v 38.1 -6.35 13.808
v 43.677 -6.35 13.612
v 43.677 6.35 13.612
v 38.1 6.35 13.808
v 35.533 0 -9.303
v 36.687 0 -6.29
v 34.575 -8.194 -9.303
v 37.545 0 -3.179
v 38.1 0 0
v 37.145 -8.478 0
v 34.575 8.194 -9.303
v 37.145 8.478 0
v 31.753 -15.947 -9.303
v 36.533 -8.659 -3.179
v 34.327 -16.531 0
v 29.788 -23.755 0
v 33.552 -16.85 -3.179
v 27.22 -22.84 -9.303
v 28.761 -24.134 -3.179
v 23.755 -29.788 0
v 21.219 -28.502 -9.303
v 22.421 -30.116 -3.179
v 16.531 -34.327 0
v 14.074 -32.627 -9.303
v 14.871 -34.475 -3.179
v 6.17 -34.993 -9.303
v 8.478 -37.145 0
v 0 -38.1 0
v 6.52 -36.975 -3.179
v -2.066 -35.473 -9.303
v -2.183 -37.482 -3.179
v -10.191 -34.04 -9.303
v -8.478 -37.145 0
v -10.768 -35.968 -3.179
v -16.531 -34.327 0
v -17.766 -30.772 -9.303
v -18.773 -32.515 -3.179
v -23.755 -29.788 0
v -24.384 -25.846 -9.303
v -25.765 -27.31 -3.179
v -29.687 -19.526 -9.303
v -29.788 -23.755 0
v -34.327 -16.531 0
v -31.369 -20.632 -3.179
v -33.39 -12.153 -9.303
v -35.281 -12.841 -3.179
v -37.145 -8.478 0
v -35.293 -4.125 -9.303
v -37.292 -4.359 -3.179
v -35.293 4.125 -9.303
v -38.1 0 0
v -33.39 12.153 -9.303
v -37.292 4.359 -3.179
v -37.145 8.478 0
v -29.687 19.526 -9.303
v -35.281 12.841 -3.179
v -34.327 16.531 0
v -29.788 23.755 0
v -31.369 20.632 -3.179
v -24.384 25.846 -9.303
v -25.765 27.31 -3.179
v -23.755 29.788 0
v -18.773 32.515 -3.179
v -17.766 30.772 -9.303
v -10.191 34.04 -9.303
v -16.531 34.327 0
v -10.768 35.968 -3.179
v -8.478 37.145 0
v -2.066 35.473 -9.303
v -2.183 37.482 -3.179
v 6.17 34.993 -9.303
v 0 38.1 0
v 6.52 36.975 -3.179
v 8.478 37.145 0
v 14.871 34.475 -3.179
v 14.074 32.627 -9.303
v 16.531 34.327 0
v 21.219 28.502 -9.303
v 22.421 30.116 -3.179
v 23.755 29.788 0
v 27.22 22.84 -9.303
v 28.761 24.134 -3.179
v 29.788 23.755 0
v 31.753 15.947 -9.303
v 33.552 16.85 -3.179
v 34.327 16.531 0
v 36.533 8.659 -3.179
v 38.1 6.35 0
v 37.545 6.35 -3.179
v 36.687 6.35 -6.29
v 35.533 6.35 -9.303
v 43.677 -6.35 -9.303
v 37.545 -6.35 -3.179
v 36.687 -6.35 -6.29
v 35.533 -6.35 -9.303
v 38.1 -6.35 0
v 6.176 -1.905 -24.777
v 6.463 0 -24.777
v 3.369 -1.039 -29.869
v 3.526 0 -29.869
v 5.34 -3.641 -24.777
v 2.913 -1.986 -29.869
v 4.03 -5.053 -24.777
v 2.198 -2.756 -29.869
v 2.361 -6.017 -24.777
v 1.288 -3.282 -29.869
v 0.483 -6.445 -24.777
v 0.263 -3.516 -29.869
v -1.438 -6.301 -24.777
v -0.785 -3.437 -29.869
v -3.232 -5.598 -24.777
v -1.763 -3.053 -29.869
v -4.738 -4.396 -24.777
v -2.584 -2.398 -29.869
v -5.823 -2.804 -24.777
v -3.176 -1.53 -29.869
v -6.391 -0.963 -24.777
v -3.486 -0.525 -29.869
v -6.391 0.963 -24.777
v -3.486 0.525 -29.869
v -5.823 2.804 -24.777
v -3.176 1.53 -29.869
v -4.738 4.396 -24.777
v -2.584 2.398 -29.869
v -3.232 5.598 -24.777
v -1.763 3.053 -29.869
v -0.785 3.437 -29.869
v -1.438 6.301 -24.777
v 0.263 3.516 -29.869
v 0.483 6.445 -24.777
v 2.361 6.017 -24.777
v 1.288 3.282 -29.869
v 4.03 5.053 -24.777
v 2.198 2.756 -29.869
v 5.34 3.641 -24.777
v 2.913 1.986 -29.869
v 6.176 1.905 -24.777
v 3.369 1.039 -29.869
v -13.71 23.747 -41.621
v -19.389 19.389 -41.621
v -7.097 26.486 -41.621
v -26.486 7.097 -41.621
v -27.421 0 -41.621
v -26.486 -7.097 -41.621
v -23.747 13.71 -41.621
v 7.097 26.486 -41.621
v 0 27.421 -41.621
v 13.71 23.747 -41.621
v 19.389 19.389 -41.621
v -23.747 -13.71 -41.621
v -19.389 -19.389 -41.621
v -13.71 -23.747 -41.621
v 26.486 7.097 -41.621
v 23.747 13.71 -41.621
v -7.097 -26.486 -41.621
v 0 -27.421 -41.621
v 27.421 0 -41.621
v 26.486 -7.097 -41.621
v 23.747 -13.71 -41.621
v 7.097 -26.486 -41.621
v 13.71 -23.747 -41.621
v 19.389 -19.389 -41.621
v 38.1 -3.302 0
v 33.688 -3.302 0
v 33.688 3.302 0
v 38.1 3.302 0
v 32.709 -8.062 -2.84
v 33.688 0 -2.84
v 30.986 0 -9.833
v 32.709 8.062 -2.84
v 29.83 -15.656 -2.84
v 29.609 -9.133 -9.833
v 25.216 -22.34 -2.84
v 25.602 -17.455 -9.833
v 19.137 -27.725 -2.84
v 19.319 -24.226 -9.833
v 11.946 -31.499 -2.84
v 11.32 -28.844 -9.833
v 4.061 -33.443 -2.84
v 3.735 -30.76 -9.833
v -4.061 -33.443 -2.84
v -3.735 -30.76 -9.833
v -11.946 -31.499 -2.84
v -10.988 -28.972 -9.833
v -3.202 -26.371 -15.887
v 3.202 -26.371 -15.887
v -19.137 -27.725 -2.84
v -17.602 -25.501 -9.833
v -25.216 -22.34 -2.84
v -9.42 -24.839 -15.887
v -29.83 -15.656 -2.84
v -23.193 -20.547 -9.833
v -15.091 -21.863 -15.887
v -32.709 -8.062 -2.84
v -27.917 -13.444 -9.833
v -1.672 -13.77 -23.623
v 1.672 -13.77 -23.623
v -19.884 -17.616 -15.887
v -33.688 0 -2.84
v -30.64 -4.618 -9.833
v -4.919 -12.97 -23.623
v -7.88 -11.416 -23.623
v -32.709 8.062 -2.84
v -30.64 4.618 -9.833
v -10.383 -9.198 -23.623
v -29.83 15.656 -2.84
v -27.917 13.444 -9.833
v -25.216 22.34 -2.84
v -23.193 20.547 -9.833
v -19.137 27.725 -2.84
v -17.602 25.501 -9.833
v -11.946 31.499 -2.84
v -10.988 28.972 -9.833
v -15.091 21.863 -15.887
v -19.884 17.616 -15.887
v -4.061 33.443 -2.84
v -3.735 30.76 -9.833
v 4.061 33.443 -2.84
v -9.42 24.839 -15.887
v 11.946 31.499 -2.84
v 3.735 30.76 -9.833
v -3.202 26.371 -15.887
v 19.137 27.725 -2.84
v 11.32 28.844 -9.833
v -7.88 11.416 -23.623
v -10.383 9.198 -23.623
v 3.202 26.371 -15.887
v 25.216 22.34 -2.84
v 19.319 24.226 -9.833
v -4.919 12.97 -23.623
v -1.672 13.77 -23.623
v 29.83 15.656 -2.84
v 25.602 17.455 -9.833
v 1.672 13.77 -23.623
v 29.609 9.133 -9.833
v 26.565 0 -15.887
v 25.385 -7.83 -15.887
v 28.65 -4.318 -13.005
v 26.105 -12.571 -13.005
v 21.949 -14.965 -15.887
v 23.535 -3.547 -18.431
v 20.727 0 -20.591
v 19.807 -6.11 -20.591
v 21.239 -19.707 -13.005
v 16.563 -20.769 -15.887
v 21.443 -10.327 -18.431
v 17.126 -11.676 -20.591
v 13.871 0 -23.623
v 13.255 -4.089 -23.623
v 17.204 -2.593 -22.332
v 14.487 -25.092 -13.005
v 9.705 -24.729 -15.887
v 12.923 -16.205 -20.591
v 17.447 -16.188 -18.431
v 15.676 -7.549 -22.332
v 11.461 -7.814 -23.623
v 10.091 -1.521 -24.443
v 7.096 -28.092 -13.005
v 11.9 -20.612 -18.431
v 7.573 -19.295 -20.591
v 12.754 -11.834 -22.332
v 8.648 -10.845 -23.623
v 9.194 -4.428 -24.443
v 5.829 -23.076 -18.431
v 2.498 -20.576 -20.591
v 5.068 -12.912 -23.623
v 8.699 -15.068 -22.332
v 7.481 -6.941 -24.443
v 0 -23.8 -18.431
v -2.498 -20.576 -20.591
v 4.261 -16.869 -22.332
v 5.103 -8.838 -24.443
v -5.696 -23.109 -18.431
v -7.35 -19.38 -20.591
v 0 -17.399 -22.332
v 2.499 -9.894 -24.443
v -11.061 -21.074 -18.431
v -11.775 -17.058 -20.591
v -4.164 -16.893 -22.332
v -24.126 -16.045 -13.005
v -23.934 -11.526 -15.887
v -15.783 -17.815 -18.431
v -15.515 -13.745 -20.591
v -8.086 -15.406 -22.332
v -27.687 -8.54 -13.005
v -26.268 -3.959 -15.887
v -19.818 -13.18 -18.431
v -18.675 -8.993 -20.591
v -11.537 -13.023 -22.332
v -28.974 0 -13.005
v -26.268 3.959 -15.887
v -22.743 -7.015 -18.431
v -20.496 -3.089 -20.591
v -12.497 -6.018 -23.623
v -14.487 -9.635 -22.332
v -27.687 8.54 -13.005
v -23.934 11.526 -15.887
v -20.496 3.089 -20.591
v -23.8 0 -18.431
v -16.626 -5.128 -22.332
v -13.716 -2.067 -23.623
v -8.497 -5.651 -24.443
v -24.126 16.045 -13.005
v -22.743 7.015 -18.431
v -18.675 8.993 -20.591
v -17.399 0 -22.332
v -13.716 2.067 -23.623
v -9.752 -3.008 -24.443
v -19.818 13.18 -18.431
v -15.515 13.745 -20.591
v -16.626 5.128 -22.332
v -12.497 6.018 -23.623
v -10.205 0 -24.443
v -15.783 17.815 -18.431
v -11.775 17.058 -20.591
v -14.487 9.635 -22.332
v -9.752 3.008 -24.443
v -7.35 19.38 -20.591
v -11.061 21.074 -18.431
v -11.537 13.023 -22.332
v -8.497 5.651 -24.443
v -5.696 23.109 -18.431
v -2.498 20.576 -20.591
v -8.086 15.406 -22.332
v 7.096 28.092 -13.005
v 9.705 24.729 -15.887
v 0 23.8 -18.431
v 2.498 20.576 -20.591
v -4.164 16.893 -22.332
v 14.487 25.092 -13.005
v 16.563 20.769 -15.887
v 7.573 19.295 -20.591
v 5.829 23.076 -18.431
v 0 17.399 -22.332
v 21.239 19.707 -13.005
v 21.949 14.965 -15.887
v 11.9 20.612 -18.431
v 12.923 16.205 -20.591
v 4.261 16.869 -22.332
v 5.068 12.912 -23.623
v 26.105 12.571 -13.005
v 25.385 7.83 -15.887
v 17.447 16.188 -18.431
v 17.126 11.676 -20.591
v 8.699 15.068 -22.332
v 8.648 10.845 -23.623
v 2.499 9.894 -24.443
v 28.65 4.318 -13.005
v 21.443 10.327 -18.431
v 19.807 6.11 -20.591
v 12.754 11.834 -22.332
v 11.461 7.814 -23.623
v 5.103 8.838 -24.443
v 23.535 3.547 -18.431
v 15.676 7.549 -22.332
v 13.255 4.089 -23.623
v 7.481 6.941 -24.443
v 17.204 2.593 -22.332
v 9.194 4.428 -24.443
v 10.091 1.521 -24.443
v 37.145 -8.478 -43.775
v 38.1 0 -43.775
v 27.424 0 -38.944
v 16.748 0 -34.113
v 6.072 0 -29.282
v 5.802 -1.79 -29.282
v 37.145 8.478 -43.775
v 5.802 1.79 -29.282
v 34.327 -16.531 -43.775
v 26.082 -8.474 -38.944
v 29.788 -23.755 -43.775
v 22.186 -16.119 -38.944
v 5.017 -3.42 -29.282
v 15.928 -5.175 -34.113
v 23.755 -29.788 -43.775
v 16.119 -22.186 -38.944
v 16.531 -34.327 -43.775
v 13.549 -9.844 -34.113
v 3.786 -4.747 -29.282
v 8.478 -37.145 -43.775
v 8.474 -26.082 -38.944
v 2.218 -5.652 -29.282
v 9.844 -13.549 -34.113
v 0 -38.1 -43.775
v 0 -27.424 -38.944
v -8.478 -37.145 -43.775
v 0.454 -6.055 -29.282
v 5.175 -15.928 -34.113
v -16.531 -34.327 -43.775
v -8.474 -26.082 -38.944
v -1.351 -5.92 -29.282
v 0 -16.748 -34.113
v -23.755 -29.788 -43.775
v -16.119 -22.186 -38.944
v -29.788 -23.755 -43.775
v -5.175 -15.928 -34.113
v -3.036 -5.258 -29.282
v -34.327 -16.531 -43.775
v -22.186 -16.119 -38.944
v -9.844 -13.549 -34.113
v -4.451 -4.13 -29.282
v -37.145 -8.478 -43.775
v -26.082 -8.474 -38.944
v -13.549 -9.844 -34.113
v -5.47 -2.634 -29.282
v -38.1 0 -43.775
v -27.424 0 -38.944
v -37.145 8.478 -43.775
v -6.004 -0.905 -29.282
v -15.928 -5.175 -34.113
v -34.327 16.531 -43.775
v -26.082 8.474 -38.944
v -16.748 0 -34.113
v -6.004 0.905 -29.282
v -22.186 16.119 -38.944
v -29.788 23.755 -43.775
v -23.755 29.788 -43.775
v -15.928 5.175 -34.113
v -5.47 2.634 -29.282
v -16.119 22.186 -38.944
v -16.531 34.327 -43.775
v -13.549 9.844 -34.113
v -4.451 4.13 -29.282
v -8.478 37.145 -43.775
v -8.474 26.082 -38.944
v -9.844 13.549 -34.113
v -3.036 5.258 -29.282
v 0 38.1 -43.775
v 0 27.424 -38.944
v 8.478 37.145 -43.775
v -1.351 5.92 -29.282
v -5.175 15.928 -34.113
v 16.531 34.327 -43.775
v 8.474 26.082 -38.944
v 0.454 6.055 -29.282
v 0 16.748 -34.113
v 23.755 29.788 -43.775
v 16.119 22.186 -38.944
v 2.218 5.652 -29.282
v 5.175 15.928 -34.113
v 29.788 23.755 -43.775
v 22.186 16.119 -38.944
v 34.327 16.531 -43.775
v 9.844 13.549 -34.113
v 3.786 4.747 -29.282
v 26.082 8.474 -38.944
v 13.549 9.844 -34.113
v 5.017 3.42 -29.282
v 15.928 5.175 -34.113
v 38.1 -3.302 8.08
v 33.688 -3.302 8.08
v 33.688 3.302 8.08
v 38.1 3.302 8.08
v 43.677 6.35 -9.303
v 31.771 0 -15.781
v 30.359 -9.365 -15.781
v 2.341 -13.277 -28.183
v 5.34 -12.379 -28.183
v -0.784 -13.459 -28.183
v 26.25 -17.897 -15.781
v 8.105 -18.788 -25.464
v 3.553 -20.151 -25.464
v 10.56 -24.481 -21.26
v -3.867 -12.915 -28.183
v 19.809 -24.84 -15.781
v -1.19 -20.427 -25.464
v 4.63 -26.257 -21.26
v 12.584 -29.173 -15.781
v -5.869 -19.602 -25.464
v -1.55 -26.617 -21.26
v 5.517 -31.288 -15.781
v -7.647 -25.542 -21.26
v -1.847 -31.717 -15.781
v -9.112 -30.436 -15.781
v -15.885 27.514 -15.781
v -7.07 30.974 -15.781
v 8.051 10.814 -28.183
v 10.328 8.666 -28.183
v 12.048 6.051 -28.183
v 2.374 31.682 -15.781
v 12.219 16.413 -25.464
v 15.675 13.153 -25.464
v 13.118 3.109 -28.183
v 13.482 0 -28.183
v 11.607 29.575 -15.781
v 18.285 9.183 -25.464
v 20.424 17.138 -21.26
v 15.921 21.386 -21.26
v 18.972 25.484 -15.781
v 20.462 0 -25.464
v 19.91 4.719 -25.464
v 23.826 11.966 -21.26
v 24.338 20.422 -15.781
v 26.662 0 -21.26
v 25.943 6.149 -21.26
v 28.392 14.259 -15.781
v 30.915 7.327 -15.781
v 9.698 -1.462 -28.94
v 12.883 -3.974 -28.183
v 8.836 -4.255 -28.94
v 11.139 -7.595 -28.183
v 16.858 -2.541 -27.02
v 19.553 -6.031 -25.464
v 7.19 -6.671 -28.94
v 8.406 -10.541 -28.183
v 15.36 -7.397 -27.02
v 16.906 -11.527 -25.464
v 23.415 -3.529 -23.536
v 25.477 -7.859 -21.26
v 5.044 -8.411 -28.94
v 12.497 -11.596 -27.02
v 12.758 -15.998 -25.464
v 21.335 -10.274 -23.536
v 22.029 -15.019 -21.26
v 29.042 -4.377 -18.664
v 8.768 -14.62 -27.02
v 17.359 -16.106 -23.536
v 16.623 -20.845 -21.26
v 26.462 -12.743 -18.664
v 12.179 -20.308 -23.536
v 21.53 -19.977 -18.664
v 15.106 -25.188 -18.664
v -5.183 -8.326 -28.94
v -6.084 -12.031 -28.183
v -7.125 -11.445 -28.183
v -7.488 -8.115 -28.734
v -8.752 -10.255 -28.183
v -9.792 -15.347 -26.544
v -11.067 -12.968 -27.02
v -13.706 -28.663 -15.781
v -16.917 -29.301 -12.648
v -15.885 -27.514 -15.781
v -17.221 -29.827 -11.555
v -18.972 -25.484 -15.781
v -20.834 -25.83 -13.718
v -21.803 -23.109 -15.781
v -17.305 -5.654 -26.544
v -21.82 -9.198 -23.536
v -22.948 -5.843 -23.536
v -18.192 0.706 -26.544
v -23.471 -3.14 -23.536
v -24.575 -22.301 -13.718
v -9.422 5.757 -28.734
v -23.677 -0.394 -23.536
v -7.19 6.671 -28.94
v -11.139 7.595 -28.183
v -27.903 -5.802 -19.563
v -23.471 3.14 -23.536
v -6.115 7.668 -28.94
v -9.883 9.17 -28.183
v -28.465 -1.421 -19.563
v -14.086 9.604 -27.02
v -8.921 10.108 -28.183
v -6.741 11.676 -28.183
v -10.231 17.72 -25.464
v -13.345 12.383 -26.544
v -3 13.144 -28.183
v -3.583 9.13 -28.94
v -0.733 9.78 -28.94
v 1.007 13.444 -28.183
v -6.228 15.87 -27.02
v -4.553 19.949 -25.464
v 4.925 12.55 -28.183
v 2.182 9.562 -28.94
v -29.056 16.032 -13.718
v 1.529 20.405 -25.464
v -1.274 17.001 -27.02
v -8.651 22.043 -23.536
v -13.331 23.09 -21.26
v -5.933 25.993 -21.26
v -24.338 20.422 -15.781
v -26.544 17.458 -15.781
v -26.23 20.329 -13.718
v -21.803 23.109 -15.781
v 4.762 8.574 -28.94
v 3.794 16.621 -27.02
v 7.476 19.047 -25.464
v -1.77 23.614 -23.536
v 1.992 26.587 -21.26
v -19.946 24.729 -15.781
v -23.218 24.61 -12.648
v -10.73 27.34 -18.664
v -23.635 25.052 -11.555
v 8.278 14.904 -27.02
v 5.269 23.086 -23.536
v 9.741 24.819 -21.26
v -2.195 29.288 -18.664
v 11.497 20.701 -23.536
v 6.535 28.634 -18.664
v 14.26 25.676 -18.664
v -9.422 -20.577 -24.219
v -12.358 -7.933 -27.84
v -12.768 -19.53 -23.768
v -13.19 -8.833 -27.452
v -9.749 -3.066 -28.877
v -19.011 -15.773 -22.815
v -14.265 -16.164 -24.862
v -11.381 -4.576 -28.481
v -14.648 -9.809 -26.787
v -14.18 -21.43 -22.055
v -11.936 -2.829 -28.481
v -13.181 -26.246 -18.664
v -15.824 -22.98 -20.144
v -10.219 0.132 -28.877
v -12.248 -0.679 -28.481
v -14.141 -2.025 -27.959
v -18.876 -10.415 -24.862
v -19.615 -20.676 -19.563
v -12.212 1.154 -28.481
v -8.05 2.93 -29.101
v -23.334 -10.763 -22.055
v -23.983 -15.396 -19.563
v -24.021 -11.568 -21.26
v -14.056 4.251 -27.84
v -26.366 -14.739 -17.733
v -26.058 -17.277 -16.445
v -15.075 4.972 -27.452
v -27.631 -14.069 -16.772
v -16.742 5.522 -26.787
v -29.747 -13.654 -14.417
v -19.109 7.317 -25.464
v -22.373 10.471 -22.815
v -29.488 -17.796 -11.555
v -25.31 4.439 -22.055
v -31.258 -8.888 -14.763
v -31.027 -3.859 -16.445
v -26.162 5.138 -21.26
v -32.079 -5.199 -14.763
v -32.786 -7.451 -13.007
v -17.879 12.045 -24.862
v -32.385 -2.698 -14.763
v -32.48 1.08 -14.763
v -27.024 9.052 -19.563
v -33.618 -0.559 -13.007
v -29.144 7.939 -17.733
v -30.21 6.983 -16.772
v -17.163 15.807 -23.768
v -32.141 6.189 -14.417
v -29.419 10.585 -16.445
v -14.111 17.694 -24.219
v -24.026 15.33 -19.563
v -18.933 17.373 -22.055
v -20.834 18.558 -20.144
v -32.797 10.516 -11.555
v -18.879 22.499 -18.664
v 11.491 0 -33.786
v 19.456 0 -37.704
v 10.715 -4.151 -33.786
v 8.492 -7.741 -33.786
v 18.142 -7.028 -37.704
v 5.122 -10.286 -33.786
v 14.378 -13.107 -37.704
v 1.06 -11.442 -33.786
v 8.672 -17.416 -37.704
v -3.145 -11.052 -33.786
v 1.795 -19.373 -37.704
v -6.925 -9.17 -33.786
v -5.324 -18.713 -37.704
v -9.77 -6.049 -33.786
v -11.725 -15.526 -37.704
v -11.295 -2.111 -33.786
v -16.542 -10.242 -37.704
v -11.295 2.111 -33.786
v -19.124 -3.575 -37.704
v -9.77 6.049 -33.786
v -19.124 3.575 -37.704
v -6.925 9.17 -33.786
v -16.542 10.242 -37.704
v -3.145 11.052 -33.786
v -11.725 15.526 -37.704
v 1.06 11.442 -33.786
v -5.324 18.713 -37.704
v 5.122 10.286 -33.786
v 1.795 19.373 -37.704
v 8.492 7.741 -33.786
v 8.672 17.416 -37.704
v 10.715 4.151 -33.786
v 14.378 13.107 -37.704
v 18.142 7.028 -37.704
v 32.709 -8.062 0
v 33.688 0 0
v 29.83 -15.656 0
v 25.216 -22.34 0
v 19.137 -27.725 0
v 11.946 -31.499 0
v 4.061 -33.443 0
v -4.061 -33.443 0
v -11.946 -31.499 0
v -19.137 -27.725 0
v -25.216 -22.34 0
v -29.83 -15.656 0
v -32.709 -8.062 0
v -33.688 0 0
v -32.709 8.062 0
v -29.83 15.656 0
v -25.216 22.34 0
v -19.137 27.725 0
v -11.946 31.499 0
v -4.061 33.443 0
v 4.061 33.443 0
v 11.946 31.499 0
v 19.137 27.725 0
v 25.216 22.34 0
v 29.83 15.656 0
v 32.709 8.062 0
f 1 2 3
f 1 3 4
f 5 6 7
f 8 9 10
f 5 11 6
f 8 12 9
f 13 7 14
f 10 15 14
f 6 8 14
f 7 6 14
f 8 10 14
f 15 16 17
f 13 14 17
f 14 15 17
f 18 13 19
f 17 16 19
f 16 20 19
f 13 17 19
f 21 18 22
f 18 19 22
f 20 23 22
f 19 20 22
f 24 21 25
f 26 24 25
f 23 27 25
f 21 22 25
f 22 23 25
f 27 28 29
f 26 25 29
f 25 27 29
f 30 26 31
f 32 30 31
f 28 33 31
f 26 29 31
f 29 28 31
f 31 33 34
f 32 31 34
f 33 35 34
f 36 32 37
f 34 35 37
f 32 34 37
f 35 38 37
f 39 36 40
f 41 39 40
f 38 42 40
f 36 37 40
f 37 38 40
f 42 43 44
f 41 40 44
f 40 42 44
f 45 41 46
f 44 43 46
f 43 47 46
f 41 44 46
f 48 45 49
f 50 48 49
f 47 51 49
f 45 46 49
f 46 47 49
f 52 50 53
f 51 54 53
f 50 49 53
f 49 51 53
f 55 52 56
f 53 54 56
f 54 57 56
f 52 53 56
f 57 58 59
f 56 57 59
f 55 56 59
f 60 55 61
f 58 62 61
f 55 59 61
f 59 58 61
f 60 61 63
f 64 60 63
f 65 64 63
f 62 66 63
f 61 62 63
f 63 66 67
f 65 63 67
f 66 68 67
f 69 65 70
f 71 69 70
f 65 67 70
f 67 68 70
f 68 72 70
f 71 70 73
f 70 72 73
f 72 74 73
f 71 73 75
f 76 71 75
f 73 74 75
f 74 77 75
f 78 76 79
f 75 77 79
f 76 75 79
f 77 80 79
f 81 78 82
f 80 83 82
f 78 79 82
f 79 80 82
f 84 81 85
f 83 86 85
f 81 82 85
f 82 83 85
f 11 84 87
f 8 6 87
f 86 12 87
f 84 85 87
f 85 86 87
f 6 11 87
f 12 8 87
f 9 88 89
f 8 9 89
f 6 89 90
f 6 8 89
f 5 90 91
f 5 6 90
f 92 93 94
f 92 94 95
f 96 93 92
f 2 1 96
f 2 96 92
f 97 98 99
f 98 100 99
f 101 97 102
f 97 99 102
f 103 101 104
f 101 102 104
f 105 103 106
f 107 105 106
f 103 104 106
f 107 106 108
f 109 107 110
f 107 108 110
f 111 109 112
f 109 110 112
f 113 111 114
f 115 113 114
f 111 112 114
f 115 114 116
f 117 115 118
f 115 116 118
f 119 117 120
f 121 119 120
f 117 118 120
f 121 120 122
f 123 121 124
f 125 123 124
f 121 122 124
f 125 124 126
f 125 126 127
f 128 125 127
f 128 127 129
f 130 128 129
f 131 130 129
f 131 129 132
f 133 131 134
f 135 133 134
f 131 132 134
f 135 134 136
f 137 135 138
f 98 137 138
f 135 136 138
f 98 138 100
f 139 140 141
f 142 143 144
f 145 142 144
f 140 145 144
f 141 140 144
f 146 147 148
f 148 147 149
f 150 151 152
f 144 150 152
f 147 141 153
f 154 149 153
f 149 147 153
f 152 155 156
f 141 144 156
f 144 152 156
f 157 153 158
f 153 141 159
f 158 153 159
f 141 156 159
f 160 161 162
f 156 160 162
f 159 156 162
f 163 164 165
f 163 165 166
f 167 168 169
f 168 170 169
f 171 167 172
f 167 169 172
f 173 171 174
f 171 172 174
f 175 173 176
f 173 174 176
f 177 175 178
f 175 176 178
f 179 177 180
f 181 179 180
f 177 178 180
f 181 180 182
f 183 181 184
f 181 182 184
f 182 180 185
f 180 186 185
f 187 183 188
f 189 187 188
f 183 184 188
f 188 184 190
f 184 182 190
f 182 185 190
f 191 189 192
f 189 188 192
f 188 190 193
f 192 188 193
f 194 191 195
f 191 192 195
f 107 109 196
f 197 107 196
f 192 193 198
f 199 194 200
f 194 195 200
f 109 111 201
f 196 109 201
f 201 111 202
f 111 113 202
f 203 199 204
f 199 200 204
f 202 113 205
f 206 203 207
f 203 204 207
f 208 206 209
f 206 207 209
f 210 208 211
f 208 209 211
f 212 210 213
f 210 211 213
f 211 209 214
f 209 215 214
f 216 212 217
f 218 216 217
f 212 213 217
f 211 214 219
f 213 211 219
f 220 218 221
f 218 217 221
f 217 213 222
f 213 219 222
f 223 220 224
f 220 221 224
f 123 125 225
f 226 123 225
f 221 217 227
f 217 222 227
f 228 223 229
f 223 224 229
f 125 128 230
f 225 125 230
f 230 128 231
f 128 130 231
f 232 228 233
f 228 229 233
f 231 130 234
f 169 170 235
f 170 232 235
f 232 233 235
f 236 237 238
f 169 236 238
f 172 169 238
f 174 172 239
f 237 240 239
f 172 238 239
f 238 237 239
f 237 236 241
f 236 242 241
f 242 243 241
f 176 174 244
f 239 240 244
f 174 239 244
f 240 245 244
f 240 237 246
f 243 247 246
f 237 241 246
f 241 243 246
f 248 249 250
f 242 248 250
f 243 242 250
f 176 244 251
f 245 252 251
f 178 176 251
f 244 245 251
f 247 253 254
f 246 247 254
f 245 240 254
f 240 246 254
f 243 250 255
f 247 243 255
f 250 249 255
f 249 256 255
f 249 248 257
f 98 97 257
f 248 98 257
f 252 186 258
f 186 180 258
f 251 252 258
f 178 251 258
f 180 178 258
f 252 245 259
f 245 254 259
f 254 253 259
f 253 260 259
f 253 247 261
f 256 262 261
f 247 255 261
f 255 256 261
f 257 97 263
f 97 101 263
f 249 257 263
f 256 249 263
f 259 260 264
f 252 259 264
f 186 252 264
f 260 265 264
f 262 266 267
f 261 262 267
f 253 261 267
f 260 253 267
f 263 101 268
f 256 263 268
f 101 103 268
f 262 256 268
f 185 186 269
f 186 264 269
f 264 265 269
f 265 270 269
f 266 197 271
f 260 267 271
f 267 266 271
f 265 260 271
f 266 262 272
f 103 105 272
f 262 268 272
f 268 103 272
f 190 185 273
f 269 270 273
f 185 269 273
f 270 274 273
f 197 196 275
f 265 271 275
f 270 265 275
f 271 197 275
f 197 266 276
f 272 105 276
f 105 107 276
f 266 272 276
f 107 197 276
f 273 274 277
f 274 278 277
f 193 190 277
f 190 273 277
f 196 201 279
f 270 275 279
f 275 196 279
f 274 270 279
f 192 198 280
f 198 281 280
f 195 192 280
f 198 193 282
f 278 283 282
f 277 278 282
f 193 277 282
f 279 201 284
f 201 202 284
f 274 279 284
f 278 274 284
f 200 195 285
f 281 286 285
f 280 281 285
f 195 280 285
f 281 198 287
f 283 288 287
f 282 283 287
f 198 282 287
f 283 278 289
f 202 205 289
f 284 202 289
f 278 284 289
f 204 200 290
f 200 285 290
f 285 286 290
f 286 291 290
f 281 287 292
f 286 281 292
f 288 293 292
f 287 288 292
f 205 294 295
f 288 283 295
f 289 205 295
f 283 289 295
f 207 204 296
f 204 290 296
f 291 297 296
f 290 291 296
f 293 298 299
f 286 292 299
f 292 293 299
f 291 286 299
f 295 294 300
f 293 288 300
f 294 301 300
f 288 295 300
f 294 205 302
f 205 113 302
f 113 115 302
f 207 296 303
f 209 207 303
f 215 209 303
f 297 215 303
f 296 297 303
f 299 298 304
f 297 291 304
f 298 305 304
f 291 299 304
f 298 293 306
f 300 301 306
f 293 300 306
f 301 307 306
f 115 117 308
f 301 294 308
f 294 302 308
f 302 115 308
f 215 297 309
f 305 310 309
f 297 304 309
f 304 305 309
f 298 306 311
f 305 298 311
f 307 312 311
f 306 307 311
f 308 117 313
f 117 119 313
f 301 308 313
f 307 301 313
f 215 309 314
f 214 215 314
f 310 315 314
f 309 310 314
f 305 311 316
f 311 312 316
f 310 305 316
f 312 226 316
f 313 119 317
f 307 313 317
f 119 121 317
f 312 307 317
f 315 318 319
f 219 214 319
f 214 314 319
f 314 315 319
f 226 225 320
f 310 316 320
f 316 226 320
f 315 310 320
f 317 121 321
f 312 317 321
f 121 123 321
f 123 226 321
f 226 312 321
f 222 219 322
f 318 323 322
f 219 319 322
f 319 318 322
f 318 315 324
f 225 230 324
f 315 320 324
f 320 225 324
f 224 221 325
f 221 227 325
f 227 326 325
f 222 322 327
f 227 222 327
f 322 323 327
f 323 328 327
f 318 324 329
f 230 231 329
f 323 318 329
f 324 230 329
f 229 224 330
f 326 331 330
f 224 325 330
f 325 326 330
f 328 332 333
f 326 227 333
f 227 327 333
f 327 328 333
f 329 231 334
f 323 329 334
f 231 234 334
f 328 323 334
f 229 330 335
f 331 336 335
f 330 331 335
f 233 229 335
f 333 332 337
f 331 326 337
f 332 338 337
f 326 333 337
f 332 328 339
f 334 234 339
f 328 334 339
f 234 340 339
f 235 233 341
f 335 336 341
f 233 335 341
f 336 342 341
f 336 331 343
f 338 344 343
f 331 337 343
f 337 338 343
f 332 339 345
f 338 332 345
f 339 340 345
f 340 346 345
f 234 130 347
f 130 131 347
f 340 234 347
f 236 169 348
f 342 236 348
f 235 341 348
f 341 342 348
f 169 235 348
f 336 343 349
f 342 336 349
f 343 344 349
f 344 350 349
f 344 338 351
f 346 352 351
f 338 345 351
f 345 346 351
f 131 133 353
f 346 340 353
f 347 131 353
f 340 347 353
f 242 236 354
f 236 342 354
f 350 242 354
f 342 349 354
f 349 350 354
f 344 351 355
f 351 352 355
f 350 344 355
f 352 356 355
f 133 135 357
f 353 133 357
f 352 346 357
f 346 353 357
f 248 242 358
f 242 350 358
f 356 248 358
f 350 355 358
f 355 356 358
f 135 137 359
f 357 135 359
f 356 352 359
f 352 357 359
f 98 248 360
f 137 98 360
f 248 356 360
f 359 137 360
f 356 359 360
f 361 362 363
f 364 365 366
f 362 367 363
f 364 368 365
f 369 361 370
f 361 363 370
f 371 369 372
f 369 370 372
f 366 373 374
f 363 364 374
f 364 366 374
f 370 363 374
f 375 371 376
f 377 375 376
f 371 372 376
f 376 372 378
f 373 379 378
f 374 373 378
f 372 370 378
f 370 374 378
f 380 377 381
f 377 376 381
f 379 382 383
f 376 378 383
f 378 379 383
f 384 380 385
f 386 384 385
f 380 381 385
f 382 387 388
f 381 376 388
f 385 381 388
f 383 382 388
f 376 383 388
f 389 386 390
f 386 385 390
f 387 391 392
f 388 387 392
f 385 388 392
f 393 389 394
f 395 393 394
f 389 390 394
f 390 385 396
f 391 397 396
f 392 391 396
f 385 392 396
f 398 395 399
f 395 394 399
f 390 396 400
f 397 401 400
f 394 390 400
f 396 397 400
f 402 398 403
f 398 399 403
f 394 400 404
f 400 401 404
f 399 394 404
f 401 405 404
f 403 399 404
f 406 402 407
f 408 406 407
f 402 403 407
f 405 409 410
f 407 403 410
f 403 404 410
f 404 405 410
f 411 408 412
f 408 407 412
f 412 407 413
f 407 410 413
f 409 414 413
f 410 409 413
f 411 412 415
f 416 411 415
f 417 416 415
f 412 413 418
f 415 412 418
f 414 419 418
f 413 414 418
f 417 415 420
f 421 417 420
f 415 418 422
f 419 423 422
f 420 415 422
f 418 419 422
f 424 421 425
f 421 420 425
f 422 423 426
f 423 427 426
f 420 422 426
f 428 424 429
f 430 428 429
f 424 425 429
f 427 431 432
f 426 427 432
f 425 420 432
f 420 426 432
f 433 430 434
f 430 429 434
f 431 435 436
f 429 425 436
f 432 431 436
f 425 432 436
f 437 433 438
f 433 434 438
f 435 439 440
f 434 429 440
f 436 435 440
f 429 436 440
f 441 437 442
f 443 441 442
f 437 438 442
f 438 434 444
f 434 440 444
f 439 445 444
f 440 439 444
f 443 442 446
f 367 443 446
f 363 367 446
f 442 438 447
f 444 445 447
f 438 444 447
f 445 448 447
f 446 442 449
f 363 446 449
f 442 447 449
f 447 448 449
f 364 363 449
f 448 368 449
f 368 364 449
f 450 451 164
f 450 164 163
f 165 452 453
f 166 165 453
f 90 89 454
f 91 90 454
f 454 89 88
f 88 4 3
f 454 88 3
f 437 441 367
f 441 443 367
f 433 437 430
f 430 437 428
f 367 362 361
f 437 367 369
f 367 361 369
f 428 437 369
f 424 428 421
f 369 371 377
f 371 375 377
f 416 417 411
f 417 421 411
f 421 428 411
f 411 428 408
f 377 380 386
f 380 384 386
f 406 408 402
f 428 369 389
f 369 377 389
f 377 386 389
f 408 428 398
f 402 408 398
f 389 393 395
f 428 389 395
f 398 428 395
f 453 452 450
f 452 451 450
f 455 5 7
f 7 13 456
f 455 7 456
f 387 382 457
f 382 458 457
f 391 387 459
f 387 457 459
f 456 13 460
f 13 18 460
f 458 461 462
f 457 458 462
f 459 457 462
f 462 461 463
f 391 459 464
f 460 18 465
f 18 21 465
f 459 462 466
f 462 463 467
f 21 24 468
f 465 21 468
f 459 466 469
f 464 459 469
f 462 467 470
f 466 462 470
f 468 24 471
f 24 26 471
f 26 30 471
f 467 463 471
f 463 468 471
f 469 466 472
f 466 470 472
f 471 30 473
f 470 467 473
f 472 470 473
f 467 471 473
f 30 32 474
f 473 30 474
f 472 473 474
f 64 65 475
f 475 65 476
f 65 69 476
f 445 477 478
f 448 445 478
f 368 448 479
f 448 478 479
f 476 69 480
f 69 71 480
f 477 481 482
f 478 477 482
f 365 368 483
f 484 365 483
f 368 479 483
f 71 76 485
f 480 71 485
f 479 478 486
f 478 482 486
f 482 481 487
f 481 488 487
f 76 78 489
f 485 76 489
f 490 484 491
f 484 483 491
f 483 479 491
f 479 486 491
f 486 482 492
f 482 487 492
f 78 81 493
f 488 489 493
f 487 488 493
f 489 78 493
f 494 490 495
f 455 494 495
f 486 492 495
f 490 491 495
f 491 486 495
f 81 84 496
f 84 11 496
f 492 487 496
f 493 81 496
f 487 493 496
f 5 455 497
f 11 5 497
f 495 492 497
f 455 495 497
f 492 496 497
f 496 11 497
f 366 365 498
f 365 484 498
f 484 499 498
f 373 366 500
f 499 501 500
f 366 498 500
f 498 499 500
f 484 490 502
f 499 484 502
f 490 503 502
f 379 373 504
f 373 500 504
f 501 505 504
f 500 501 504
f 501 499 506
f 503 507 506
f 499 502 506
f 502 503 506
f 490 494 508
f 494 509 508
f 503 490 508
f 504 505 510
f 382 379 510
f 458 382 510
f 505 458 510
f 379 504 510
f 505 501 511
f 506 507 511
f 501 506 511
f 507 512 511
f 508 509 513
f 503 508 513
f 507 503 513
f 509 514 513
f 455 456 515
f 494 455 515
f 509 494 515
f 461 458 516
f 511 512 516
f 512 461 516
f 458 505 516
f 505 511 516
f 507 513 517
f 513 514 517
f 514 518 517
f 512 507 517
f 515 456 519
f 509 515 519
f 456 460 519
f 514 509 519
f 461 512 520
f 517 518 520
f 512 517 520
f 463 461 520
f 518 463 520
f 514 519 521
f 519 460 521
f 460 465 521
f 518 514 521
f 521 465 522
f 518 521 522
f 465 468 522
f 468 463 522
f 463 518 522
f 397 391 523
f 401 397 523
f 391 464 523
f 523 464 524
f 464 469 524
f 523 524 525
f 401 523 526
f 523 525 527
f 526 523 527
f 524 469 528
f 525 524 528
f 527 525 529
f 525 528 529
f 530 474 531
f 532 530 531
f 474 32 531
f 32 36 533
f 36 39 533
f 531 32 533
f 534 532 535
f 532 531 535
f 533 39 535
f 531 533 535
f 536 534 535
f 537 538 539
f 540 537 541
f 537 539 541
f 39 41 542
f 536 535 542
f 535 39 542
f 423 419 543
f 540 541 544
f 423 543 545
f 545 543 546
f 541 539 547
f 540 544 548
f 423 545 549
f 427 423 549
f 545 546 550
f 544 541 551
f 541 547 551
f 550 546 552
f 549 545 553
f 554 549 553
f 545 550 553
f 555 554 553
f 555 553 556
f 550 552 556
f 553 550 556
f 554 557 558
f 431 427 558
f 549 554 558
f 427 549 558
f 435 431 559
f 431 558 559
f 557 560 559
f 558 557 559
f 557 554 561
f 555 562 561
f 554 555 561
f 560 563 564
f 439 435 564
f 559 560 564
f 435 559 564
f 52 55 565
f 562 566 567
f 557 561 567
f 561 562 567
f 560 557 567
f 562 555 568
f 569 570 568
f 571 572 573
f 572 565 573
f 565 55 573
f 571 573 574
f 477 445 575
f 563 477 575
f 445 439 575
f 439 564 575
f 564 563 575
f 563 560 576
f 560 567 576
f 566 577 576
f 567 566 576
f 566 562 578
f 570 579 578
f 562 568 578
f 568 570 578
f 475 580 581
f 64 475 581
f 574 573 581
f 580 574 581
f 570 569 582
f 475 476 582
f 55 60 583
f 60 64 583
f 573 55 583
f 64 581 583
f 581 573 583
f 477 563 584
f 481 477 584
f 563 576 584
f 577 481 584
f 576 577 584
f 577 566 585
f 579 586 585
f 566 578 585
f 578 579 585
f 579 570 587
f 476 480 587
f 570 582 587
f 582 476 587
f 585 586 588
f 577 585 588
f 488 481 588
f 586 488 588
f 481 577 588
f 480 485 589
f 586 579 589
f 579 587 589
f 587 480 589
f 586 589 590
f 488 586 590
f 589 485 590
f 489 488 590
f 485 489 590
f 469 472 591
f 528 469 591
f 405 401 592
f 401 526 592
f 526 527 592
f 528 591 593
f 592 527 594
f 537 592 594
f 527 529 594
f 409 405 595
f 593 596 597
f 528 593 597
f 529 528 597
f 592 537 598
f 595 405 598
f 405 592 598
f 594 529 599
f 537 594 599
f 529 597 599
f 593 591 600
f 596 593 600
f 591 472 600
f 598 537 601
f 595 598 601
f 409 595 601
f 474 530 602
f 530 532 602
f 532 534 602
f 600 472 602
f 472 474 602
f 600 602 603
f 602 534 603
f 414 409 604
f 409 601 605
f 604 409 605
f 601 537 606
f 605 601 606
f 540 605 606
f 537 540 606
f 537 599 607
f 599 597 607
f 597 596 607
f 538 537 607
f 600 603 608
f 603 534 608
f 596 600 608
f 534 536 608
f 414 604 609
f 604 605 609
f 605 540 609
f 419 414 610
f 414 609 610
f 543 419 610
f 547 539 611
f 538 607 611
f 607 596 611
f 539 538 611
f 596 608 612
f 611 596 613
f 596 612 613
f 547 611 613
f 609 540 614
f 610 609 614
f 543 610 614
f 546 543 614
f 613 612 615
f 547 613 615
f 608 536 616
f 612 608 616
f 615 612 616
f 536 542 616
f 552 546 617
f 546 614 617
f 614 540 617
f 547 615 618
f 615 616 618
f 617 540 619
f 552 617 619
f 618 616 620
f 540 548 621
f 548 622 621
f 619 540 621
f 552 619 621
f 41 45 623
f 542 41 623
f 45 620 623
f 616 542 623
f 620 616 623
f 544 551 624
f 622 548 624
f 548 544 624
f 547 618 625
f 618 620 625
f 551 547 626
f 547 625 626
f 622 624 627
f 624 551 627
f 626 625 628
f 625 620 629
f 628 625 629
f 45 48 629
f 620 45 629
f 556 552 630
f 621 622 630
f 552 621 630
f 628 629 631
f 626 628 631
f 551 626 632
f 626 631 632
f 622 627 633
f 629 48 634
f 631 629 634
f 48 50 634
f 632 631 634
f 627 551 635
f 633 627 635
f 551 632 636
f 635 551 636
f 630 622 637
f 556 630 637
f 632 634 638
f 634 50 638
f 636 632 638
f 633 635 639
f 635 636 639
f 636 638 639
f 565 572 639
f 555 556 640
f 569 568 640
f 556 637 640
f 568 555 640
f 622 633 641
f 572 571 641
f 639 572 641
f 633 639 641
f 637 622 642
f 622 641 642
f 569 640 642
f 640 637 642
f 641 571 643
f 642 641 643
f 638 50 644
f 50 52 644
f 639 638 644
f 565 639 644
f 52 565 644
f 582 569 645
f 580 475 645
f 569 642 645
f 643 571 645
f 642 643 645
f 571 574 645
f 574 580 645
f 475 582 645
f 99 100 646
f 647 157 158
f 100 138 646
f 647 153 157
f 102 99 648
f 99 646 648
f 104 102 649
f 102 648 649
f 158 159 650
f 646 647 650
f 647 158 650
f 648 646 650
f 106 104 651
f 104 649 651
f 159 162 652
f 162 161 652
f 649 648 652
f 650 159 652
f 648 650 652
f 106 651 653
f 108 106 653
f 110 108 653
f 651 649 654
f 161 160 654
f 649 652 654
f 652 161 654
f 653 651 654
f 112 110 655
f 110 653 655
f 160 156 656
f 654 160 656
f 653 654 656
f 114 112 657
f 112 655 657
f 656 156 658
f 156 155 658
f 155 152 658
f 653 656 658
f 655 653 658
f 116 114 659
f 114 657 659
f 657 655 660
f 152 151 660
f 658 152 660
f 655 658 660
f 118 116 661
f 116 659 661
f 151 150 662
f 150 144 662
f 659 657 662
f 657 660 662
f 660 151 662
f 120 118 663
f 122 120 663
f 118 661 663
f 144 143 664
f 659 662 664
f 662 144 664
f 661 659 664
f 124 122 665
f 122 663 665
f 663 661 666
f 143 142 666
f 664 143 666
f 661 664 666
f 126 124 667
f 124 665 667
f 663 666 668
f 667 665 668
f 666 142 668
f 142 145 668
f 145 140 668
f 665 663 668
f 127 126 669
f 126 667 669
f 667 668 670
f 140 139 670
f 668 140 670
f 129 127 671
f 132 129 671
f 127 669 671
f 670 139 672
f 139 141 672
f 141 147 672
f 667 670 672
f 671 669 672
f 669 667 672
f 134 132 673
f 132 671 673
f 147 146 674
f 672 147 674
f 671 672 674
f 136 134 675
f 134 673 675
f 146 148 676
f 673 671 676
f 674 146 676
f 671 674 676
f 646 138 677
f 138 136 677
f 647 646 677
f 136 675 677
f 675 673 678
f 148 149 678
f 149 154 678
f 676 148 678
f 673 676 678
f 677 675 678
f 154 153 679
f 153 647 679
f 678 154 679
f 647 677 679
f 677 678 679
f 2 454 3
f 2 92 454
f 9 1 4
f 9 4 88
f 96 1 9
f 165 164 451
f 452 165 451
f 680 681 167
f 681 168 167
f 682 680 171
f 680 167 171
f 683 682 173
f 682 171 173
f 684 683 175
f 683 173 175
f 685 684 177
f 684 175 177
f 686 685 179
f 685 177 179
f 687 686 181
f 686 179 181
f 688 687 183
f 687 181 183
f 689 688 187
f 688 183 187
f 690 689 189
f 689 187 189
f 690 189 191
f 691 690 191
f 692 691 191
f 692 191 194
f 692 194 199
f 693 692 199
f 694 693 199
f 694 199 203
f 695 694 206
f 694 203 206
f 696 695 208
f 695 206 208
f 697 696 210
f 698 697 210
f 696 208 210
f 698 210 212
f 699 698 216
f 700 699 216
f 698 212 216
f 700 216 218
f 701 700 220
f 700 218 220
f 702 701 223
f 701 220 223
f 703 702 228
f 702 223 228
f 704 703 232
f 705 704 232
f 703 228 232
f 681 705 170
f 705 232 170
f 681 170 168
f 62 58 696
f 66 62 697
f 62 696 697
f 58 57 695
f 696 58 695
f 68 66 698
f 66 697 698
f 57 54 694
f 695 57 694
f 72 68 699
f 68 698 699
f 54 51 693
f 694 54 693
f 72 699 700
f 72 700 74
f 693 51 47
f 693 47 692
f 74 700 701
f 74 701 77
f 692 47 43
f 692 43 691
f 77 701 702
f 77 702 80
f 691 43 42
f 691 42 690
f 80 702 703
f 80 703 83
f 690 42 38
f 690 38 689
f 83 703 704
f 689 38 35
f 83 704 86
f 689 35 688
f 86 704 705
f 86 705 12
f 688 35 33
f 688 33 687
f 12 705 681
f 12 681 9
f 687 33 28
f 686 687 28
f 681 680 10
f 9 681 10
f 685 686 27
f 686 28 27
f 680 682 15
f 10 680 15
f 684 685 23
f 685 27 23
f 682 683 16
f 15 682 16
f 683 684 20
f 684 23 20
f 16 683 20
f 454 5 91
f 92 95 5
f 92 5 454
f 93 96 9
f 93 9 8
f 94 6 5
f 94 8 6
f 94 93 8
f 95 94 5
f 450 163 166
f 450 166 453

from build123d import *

# Parameters (mm, degrees)
F2_DEPTH = 6.35
F0_W     = 4.411578
F0_H     = 8.079828
F3_DEPTH = 3.302


with BuildPart() as f1:
    # F0 (on Front) → F1 (revolve)
    with BuildSketch(Plane.XZ):
        with BuildLine():
            Line((38.1, 0), (33.688422, 0))
            Line((33.688422, 0), (33.688422, -2.840012))
            ThreePointArc((33.688422, -2.840012), (23.800432, -18.430684), (6.463476, -24.776658))
            add(Edge.make_bspline(
                [(6.463476, -24.776658), (5.484162, -26.474137), (4.504847, -28.171616), (3.525533, -29.869094)],
                knots=[0, 0, 0, 0, 5.879151, 5.879151, 5.879151, 5.879151], degree=3))
            Line((3.525533, -29.869094), (27.420808, -41.620869))
            Line((27.420808, -41.620869), (0, -41.620869))
            Line((0, -41.620869), (0, -43.775361))
            Line((0, -43.775361), (38.1, -43.775361))
            Line((38.1, -43.775361), (6.071751, -29.281506))
            ThreePointArc((6.071751, -29.281506), (23.679884, -23.535917), (35.532989, -9.303489))
            ThreePointArc((35.532989, -9.303489), (37.153736, -4.744796), (38.1, 0))
        make_face()
    revolve(axis=Axis((0, 0, -21.887681), (0, 0, -1)))

    # F0 (on Front) → F2 (join, symmetric)
    with BuildSketch(Plane.XZ):
        Polygon((38.1, 8.079828), (38.1, 0), (38.1, -9.303489), (43.677427, -9.303489), (43.677427, 13.612472), (38.1, 13.808336), align=None)
        with BuildLine():
            Line((38.1, -9.303489), (38.1, 0))
            ThreePointArc((38.1, 0), (37.153736, -4.744796), (35.532989, -9.303489))
            Line((35.532989, -9.303489), (38.1, -9.303489))
        make_face()
    extrude(amount=F2_DEPTH, both=True)


with BuildPart() as f3:
    # F0 (on Front) → F3 (new body, symmetric)
    with BuildSketch(Plane.XZ):
        with Locations((35.894211, 4.039914)):
            Rectangle(F0_W, F0_H)
    extrude(amount=F3_DEPTH, both=True)


solid = Compound([f1.part, f3.part])
